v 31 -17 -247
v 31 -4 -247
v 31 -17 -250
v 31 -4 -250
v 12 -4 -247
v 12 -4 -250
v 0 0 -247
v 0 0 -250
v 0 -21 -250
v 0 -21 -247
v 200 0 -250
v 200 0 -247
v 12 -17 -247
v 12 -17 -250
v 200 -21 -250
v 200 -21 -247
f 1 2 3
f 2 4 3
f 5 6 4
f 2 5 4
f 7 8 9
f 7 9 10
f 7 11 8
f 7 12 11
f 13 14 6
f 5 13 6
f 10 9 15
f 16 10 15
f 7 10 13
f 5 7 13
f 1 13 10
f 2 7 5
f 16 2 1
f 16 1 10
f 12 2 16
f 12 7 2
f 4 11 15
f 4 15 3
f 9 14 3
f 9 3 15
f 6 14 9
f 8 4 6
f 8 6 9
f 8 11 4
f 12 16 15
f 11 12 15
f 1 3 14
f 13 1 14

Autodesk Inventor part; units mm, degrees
ref_plane "YZ Plane" through (0, 0, 0) normal (1, 0, 0) x (0, 1, 0)
ref_plane "XZ Plane" through (0, 0, 0) normal (0, 1, 0) x (-1, 0, 0)
ref_plane "XY Plane" through (0, 0, 0) normal (0, 0, 1) x (1, 0, 0)
sketch "block" plane through (0, 0, 0) normal (0, 1, 0) x (-1, 0, 0)
  line L0 (0, 0) -> (-200, 0)
  line L1 (-200, 0) -> (-200, -250)
  line L2 (-200, -250) -> (0, -250)
  line L3 (0, -250) -> (0, 0)
  dimension "d31" = 200
  dimension "d32" = 250
extrude "ext_block" add sketch "block" against normal blind 24
shell "Shell2" thickness 3 removed faces 0
sketch "lines_base" plane through (0, 0, 0) normal (0, 1, 0) x (-1, 0, 0)
  line L0 (0, 0) -> (-200, 0)
  line L1 (-200, 0) -> (-200, -250)
  line L2 (-200, -250) -> (0, -250)
  line L3 (0, -250) -> (0, 0)
  circle A0 centre (-65, -60) radius 6
  circle A1 centre (-125, -80) radius 6
  circle A2 centre (-65, -60) radius 12.5
  circle A3 centre (-65, -60) radius 8.5
  circle A4 centre (-125, -80) radius 8.5
  circle A5 centre (-125, -80) radius 12.5
  circle A6 centre (-175, -125) radius 3
  line L4 (-175, -125) -> (-175, -209)
  line L5 (-175, -125) -> (-91, -125) construction
  circle A7 centre (-175, -139) radius 3
  circle A8 centre (-175, -153) radius 3
  circle A9 centre (-175, -167) radius 3
  circle A10 centre (-175, -181) radius 3
  circle A11 centre (-175, -195) radius 3
  circle A12 centre (-175, -209) radius 3
  circle A13 centre (-95, -185) radius 2.5
  circle A14 centre (-95, -185) radius 5
  point P0 (-200, -125)
  dimension "d0" = 200
  dimension "d1" = 250
  dimension "d2" = 12
  dimension "d3" = 12
  dimension "d4" = 25
  dimension "d5" = 17
  dimension "d6" = 17
  dimension "d7" = 25
  dimension "d8" = 75
  dimension "d9" = 80
  dimension "d10" = 65
  dimension "d11" = 60
  dimension "d12" = 6
  dimension "d13" = 84
  dimension "d14" = 90
  dimension "d15" = 25
  dimension "d16" = 125
  dimension "d19" = 14
  dimension "d24" = 5
  dimension "d25" = 10
  dimension "d26" = 65
  dimension "d27" = 95
extrude "holes" cut sketch "lines_base" against normal up to surface (3 mm away) contours A0 | A1 | A6 | A7 L4 | L4 A7 | A8 L4 | L4 A8 | A9 L4 | L4 A9 | A10 L4 | L4 A10 | A11 L4 | L4 A11 | A12 | A13
sketch "Sketch4" plane through (200, 0, -250) normal (0, 0, -1) x (-1, 0, 0)
  line L0 (188, -4) -> (169, -4)
  line L1 (169, -4) -> (169, -17)
  line L2 (169, -17) -> (188, -17)
  line L3 (188, -17) -> (188, -4)
  line L4 (0, 0) -> (200, 0) projected
  line L5 (200, 0) -> (200, -24) projected
  dimension "d40" = 19
  dimension "d41" = 13
  dimension "d42" = 4
  dimension "d43" = 12
extrude "pwr_button_hole" cut sketch "Sketch4" against normal up to surface (3 mm away)
ref_plane "Work Plane1" through (7, -21, -243) normal (0, 1, 0) x (1, 0, 0)
sketch "Sketch5" plane through (7, -21, -243) normal (0, 1, 0) x (1, 0, 0)
  line L0 (-20.9366, 21.7948) -> (229.9216, 21.7948)
  line L1 (229.9216, 21.7948) -> (229.9216, -260.9184)
  line L2 (229.9216, -260.9184) -> (-20.9366, -260.9184)
  line L3 (-20.9366, -260.9184) -> (-20.9366, 21.7948)
  point P0 (-7, -243)
extrude "back_cover_cut" cut sketch "Sketch5" against normal through all
sketch "Sketch9" plane through (3, -3, -247) normal (0, 0, 1) x (1, 0, 0)
  line L0 (-37.3239, 25.5636) -> (215.9348, 25.5636)
  line L1 (215.9348, 25.5636) -> (215.9348, -44.9988)
  line L2 (215.9348, -44.9988) -> (-37.3239, -44.9988)
  line L3 (-37.3239, -44.9988) -> (-37.3239, 25.5636)
  point P0 (-3, 3)
extrude "Extrusion8" cut sketch "Sketch9" along normal through all
properties part number "side_right" material "Glass"
